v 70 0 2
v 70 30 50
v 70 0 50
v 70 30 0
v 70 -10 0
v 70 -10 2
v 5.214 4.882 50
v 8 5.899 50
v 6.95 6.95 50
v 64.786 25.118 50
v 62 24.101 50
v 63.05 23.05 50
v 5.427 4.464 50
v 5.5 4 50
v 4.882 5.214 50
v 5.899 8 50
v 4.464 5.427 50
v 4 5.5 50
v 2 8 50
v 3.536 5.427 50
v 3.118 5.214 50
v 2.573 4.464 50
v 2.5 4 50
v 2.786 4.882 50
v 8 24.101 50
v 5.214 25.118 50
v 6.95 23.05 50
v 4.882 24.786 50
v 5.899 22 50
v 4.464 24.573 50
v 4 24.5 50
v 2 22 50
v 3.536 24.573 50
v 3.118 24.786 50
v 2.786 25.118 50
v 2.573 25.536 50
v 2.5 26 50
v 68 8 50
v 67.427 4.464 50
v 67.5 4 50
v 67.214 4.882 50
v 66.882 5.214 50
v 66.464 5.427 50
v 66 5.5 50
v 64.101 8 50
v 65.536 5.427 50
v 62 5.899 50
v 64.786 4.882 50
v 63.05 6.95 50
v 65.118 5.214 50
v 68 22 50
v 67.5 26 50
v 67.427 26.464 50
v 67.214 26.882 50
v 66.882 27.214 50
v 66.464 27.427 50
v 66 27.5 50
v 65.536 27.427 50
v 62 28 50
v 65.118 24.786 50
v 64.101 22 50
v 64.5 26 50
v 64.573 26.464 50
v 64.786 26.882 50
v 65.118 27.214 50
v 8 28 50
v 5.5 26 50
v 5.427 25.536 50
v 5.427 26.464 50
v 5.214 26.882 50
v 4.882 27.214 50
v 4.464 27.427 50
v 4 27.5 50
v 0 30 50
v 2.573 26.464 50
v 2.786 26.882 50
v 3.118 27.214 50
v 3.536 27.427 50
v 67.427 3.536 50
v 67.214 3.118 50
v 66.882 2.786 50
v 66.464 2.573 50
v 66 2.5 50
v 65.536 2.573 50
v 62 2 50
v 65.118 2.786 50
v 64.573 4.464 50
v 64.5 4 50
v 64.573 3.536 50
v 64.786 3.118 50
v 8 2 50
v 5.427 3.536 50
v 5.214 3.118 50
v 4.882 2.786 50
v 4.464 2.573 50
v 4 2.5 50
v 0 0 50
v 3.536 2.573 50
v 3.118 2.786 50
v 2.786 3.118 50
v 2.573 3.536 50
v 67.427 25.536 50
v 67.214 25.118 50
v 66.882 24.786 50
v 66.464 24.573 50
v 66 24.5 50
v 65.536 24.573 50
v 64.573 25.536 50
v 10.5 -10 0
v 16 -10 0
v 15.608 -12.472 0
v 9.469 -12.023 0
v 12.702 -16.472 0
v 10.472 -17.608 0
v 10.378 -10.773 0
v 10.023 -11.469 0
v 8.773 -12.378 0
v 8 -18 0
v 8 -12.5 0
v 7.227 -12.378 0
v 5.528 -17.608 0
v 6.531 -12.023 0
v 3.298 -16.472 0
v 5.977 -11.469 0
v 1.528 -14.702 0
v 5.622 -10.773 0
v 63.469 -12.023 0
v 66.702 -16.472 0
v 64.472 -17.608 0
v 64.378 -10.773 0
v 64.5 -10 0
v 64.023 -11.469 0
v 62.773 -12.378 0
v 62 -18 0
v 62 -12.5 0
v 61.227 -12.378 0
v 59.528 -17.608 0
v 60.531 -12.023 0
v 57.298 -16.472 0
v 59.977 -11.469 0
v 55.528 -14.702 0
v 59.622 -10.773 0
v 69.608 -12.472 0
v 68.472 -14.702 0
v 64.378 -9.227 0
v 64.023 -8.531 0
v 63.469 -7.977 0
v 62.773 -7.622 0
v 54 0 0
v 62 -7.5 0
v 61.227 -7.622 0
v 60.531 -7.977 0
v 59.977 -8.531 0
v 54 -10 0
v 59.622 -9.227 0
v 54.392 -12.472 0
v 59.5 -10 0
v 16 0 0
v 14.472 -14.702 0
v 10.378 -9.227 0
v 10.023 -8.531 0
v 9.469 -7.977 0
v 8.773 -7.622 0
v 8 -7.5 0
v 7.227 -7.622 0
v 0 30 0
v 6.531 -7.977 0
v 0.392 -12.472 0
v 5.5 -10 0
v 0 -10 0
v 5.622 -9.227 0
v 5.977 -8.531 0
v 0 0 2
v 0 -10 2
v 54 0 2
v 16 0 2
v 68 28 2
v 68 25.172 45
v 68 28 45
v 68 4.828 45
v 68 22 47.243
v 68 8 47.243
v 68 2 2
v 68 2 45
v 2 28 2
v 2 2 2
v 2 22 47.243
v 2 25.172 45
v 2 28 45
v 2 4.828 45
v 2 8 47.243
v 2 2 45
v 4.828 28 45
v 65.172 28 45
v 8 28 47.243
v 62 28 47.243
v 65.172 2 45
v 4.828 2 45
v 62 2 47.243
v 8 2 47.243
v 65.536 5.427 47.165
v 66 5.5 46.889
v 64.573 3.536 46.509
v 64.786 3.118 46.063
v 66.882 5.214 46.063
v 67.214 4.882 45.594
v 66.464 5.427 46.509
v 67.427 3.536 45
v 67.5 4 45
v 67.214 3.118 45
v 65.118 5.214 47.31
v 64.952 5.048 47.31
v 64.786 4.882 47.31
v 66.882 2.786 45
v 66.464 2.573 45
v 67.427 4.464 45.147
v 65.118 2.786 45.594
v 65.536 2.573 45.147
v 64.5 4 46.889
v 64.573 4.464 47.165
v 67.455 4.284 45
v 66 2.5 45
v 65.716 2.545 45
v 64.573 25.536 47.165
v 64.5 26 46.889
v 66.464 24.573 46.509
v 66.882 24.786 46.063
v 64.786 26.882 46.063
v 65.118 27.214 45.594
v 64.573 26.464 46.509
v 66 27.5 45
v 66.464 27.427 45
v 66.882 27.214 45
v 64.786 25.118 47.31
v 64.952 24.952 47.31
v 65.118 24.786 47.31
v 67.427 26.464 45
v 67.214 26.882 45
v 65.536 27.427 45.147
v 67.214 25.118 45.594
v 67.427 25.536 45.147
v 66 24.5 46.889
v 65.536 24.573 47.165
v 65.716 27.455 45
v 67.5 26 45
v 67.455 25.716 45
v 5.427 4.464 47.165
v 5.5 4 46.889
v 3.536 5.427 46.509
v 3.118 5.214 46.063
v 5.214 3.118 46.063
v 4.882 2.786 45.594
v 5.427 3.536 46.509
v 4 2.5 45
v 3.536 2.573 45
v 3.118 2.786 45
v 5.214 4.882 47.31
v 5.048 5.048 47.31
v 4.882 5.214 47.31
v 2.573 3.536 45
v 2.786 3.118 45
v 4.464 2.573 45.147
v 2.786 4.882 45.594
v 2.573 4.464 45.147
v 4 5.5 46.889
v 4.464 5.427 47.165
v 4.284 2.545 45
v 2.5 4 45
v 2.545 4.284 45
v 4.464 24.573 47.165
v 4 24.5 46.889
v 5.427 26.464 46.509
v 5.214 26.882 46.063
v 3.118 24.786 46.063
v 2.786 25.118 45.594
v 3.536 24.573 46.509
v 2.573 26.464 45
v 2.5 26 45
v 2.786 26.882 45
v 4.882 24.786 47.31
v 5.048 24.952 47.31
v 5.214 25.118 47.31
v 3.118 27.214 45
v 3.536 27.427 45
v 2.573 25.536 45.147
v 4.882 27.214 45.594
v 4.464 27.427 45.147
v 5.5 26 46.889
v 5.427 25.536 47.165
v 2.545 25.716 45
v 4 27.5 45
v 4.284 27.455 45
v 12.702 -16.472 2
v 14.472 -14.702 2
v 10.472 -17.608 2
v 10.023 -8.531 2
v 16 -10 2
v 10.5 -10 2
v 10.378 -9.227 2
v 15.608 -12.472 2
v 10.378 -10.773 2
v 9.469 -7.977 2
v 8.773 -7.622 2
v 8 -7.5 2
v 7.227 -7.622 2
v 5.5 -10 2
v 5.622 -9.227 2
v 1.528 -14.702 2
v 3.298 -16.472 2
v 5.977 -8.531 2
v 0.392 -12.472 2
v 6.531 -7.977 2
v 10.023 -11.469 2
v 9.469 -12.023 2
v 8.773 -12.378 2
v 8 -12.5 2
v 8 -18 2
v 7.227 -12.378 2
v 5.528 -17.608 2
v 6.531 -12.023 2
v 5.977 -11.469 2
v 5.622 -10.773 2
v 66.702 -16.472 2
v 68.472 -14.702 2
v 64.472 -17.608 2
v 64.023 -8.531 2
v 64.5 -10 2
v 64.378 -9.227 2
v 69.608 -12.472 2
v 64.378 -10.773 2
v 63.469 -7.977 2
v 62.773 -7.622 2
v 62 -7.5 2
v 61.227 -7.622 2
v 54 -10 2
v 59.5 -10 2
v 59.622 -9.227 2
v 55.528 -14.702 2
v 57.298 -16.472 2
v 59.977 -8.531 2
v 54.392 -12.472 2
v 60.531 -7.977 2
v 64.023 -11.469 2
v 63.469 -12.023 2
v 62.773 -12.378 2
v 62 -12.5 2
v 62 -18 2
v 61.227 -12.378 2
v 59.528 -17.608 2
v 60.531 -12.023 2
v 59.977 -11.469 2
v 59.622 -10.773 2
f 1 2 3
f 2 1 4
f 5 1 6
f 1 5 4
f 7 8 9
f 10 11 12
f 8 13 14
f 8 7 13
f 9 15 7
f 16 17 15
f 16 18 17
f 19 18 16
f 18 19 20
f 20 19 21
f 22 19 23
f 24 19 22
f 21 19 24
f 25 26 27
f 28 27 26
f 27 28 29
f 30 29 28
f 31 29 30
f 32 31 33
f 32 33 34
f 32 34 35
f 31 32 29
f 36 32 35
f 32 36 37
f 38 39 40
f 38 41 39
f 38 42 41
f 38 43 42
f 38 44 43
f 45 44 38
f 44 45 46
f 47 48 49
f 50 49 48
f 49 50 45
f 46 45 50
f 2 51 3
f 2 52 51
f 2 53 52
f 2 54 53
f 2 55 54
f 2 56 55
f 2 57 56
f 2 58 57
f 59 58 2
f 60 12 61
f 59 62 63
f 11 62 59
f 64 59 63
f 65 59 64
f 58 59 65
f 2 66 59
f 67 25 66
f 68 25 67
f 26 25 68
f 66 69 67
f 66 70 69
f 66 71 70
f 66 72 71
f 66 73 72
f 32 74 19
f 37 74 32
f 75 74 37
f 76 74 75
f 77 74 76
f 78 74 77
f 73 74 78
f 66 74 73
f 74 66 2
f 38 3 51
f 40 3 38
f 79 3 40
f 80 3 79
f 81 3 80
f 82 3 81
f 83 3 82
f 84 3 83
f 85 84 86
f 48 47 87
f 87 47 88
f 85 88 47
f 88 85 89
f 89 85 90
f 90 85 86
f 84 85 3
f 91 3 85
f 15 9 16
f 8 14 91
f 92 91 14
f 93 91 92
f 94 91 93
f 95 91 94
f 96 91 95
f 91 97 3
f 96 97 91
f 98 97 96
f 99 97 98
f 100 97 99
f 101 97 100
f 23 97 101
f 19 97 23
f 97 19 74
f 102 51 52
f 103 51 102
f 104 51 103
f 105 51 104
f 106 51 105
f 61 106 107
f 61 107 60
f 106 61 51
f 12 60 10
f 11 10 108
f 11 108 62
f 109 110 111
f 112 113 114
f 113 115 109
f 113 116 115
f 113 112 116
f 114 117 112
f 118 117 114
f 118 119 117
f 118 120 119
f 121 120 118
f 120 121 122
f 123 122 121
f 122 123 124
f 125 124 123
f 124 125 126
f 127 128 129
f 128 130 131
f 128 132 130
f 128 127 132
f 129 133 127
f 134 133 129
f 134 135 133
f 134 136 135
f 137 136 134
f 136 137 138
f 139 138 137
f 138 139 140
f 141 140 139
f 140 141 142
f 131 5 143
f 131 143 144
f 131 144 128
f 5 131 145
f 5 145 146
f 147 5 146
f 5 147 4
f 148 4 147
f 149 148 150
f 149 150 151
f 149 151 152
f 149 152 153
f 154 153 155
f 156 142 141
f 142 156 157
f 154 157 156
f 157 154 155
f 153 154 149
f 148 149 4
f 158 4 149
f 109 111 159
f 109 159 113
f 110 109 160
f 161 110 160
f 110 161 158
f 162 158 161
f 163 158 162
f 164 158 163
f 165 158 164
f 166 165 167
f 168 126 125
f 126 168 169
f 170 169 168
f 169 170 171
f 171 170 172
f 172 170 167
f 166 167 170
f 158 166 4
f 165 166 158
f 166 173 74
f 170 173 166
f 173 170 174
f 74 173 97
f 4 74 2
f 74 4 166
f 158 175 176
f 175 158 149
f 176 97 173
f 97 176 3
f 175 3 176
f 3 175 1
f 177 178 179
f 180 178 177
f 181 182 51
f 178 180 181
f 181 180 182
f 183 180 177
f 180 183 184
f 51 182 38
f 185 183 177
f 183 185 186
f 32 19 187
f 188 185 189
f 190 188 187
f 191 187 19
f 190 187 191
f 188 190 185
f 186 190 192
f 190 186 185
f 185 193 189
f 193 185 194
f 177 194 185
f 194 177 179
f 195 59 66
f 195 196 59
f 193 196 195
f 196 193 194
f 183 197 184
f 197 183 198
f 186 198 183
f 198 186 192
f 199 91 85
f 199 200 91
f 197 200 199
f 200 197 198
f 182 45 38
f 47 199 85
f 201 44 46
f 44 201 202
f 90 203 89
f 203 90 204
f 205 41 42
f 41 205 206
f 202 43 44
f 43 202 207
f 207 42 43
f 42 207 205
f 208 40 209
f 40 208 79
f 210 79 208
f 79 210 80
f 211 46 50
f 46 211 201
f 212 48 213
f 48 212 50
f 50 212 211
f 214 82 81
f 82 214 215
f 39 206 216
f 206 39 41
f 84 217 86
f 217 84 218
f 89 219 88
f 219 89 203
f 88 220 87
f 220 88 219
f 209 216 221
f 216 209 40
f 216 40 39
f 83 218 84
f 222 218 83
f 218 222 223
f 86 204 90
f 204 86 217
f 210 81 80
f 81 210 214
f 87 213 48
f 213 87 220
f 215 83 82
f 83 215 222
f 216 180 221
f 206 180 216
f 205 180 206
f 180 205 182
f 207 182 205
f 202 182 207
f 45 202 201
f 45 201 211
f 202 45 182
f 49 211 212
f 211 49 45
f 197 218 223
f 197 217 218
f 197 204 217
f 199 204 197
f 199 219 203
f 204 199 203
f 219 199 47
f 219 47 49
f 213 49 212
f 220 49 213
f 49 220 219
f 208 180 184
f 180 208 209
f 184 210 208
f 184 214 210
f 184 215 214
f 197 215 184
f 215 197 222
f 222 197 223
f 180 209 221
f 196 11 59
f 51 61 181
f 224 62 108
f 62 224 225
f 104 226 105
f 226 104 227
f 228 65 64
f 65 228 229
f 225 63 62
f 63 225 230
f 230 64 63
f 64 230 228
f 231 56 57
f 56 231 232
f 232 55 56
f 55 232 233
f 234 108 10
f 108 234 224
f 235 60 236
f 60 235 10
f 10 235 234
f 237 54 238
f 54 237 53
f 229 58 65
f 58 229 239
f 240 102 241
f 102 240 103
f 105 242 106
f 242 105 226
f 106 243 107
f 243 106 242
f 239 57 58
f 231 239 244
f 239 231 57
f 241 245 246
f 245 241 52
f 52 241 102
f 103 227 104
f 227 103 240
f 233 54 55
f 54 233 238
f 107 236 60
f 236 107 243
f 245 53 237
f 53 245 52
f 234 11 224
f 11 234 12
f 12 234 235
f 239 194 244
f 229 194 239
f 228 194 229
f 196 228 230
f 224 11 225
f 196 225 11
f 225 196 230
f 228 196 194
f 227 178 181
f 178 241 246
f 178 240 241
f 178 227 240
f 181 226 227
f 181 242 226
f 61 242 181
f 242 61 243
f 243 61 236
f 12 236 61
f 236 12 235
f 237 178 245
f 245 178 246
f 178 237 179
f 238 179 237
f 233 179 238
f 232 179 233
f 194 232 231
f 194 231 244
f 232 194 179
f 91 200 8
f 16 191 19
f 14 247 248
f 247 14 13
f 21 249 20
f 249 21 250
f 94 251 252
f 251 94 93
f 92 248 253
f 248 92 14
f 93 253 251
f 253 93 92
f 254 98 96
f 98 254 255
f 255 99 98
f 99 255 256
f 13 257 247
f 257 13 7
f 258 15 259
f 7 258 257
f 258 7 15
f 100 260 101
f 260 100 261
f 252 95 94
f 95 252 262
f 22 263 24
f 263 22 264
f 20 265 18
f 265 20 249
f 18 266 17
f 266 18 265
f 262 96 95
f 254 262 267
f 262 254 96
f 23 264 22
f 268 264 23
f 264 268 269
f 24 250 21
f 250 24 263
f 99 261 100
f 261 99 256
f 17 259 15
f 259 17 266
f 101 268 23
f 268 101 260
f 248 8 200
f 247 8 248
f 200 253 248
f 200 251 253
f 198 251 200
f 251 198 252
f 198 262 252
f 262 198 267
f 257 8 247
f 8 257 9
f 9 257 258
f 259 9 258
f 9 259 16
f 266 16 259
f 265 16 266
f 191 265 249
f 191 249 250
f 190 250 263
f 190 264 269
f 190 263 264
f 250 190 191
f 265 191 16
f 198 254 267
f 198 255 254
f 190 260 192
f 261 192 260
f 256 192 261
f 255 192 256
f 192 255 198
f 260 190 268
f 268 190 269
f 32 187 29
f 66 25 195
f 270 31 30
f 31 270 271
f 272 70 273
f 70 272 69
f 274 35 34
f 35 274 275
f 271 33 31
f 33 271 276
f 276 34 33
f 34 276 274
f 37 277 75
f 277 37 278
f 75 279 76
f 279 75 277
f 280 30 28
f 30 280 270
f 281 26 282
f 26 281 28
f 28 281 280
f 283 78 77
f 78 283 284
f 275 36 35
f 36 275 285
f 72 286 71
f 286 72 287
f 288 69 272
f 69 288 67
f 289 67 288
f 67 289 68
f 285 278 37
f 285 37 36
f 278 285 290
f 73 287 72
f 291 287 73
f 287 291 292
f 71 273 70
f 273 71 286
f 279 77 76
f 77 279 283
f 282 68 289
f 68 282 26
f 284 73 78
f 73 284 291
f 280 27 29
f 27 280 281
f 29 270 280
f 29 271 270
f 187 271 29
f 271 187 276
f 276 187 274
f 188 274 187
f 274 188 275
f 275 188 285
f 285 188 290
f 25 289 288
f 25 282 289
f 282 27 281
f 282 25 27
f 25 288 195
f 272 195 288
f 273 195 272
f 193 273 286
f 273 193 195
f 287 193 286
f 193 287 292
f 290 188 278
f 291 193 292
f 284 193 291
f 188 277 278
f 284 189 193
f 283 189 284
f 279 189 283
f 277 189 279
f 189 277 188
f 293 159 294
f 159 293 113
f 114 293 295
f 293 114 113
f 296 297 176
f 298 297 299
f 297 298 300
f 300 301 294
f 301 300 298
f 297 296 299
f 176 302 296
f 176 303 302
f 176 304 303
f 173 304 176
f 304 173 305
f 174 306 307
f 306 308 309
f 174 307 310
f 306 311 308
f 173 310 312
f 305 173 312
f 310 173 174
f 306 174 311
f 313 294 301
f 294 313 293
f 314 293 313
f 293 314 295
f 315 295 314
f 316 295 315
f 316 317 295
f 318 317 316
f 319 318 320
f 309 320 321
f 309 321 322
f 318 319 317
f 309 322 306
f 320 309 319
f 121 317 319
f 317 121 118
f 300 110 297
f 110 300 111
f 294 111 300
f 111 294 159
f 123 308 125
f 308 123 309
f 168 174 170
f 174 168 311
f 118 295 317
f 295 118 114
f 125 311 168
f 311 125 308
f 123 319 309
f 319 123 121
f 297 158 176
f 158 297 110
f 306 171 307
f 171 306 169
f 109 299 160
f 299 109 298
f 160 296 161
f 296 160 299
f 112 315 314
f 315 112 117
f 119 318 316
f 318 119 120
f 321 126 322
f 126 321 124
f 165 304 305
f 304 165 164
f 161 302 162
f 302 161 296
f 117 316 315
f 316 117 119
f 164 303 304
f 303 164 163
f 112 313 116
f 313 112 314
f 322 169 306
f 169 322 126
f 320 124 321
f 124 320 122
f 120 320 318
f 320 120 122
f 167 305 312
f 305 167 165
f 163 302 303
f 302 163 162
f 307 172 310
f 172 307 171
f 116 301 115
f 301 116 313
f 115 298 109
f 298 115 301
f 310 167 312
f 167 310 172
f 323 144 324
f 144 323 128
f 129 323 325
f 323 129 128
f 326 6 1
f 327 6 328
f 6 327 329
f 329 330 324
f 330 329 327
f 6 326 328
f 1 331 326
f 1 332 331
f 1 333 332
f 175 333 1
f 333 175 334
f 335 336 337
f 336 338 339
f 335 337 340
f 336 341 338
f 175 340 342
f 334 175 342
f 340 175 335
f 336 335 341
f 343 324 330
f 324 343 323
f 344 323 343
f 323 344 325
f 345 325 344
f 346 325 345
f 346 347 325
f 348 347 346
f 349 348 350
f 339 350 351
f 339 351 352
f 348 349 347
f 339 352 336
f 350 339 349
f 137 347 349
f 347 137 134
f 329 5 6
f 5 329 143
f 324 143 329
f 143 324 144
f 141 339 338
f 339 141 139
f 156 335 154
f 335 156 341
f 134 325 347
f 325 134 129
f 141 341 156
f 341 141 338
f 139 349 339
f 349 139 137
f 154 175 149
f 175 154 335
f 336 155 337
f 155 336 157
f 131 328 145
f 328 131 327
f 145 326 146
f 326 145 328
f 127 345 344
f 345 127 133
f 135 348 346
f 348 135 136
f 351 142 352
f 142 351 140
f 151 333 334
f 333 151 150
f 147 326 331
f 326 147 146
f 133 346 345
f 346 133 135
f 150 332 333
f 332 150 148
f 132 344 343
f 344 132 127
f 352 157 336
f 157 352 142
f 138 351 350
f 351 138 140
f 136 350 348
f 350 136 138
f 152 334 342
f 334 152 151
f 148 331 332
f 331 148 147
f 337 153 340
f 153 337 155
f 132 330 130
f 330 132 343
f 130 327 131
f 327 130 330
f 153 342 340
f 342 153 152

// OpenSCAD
part="box";
wall=2;
screwd=3;
if(part=="box") box(70,30,50);
else if(part=="box2") box(60,32,20);
else if(part=="box3") box3();
else if(part=="lid") lid(70,30,50);
else if(part=="lid2") lid(60,32,20);
else if(part=="all2") {
  box(60,32,20);
  translate([0,0,20]) color("green") box3();
  translate([0,0,42]) mirror([0,0,1]) lid(60,32,20);
}
else if(part=="both") {
  box();
  %translate([0,0,42]) mirror([0,0,1]) lid();
}

module lid(w=60,h=30,d=40){
  difference(){
    union(){
    cube([w,h,wall]);
        translate([wall+6.5,wall+.5,wall]) cube([w-18,h-5,wall]);
      translate([wall+.5,6+wall+.5]) cube([w-wall*2-1,13,4.02]);
    }
    translate([wall*2,wall*2,-.01]) cylinder(d=screwd,h=wall+.02,$fn=20); 
    translate([wall*2,h-wall*2,-.01]) cylinder(d=screwd,h=wall+.02,$fn=20);
    translate([w-wall*2,wall*2,-.01]) cylinder(d=screwd,h=wall+.02,$fn=20);
    translate([w-wall*2,h-wall*2,-.01]) cylinder(d=screwd,h=wall+.02,$fn=20);
        translate([wall+.49,6+wall+.49,-.01]) cube([14,13.92,5.02]);

  }
}
module box3(w=60,h=32,d=20){
  difference(){
    union(){
      difference(){
        cube([w,h,d]);
        translate([wall,wall,wall])
          cube([w-wall*2,h-wall*2,d]);
      }
      translate([wall,wall]) cube([6,6,d]);
      translate([w-wall-6,wall]) cube([6,6,d]);
      translate([wall,h-wall-6]) cube([6,6,d]);
      translate([w-wall-6,h-wall-6]) cube([6,6,d]);
    }
    translate([wall+2,wall+2,-.01]) cylinder(d=screwd,h=d+.02,$fn=20);
    translate([w-wall-2,wall+2,-.01]) cylinder(d=screwd,h=d+.02,$fn=20);
    translate([wall+2,h-wall-2,-.01]) cylinder(d=screwd,h=d+.02,$fn=20);
    translate([w-wall-2,h-wall-2,-.01]) cylinder(d=screwd,h=d+.02,$fn=20);
    translate([wall,wall+6,-.01]) cube([6,h-wall*2-12,2.02]);
  }
}
module box(w=60,h=30,d=40){
difference(){
  cube([w,h,d]);
  translate([wall,wall,wall])
    cube([w-wall*2,h-wall*2,d]);
}
translate([w-wall,wall,d-4-wall]) rotate([0,0,90]) screw_cliff();
translate([w-wall,h-wall,d-4-wall]) rotate([0,0,180]) screw_cliff();
translate([wall,wall,d-4-wall]) screw_cliff();
translate([wall,h-wall,d-4-wall]) rotate([0,0,-90]) screw_cliff();
translate([-2,0]) difference(){
  union(){
    translate([10,-10]) cylinder(d=16,h=2,$fn=20);
    translate([2,-10]) cube([16,10,2]);
  }
  translate([10,-10,-.01]) cylinder(d=5,h=2.02,$fn=20);
}
translate([w-18,0]) difference(){
  union(){
    translate([10,-10]) cylinder(d=16,h=2,$fn=20);
    translate([2,-10]) cube([16,10,2]);
  }
  translate([10,-10,-.01]) cylinder(d=5,h=2.02,$fn=20);
}
}

module screw_cliff() {
  difference(){
    //translate([3,3]) cylinder(d=8,h=6,$fn=20);
    cube(6);
    translate([2,2,-.01]) cylinder(d=screwd,h=6.02,$fn=20);
    translate([0,0,-1]) rotate([45,45,45]) cube(20);
    translate([-.01,-.01,-4]) cube([6.02,6.02,5]);
  }
}
